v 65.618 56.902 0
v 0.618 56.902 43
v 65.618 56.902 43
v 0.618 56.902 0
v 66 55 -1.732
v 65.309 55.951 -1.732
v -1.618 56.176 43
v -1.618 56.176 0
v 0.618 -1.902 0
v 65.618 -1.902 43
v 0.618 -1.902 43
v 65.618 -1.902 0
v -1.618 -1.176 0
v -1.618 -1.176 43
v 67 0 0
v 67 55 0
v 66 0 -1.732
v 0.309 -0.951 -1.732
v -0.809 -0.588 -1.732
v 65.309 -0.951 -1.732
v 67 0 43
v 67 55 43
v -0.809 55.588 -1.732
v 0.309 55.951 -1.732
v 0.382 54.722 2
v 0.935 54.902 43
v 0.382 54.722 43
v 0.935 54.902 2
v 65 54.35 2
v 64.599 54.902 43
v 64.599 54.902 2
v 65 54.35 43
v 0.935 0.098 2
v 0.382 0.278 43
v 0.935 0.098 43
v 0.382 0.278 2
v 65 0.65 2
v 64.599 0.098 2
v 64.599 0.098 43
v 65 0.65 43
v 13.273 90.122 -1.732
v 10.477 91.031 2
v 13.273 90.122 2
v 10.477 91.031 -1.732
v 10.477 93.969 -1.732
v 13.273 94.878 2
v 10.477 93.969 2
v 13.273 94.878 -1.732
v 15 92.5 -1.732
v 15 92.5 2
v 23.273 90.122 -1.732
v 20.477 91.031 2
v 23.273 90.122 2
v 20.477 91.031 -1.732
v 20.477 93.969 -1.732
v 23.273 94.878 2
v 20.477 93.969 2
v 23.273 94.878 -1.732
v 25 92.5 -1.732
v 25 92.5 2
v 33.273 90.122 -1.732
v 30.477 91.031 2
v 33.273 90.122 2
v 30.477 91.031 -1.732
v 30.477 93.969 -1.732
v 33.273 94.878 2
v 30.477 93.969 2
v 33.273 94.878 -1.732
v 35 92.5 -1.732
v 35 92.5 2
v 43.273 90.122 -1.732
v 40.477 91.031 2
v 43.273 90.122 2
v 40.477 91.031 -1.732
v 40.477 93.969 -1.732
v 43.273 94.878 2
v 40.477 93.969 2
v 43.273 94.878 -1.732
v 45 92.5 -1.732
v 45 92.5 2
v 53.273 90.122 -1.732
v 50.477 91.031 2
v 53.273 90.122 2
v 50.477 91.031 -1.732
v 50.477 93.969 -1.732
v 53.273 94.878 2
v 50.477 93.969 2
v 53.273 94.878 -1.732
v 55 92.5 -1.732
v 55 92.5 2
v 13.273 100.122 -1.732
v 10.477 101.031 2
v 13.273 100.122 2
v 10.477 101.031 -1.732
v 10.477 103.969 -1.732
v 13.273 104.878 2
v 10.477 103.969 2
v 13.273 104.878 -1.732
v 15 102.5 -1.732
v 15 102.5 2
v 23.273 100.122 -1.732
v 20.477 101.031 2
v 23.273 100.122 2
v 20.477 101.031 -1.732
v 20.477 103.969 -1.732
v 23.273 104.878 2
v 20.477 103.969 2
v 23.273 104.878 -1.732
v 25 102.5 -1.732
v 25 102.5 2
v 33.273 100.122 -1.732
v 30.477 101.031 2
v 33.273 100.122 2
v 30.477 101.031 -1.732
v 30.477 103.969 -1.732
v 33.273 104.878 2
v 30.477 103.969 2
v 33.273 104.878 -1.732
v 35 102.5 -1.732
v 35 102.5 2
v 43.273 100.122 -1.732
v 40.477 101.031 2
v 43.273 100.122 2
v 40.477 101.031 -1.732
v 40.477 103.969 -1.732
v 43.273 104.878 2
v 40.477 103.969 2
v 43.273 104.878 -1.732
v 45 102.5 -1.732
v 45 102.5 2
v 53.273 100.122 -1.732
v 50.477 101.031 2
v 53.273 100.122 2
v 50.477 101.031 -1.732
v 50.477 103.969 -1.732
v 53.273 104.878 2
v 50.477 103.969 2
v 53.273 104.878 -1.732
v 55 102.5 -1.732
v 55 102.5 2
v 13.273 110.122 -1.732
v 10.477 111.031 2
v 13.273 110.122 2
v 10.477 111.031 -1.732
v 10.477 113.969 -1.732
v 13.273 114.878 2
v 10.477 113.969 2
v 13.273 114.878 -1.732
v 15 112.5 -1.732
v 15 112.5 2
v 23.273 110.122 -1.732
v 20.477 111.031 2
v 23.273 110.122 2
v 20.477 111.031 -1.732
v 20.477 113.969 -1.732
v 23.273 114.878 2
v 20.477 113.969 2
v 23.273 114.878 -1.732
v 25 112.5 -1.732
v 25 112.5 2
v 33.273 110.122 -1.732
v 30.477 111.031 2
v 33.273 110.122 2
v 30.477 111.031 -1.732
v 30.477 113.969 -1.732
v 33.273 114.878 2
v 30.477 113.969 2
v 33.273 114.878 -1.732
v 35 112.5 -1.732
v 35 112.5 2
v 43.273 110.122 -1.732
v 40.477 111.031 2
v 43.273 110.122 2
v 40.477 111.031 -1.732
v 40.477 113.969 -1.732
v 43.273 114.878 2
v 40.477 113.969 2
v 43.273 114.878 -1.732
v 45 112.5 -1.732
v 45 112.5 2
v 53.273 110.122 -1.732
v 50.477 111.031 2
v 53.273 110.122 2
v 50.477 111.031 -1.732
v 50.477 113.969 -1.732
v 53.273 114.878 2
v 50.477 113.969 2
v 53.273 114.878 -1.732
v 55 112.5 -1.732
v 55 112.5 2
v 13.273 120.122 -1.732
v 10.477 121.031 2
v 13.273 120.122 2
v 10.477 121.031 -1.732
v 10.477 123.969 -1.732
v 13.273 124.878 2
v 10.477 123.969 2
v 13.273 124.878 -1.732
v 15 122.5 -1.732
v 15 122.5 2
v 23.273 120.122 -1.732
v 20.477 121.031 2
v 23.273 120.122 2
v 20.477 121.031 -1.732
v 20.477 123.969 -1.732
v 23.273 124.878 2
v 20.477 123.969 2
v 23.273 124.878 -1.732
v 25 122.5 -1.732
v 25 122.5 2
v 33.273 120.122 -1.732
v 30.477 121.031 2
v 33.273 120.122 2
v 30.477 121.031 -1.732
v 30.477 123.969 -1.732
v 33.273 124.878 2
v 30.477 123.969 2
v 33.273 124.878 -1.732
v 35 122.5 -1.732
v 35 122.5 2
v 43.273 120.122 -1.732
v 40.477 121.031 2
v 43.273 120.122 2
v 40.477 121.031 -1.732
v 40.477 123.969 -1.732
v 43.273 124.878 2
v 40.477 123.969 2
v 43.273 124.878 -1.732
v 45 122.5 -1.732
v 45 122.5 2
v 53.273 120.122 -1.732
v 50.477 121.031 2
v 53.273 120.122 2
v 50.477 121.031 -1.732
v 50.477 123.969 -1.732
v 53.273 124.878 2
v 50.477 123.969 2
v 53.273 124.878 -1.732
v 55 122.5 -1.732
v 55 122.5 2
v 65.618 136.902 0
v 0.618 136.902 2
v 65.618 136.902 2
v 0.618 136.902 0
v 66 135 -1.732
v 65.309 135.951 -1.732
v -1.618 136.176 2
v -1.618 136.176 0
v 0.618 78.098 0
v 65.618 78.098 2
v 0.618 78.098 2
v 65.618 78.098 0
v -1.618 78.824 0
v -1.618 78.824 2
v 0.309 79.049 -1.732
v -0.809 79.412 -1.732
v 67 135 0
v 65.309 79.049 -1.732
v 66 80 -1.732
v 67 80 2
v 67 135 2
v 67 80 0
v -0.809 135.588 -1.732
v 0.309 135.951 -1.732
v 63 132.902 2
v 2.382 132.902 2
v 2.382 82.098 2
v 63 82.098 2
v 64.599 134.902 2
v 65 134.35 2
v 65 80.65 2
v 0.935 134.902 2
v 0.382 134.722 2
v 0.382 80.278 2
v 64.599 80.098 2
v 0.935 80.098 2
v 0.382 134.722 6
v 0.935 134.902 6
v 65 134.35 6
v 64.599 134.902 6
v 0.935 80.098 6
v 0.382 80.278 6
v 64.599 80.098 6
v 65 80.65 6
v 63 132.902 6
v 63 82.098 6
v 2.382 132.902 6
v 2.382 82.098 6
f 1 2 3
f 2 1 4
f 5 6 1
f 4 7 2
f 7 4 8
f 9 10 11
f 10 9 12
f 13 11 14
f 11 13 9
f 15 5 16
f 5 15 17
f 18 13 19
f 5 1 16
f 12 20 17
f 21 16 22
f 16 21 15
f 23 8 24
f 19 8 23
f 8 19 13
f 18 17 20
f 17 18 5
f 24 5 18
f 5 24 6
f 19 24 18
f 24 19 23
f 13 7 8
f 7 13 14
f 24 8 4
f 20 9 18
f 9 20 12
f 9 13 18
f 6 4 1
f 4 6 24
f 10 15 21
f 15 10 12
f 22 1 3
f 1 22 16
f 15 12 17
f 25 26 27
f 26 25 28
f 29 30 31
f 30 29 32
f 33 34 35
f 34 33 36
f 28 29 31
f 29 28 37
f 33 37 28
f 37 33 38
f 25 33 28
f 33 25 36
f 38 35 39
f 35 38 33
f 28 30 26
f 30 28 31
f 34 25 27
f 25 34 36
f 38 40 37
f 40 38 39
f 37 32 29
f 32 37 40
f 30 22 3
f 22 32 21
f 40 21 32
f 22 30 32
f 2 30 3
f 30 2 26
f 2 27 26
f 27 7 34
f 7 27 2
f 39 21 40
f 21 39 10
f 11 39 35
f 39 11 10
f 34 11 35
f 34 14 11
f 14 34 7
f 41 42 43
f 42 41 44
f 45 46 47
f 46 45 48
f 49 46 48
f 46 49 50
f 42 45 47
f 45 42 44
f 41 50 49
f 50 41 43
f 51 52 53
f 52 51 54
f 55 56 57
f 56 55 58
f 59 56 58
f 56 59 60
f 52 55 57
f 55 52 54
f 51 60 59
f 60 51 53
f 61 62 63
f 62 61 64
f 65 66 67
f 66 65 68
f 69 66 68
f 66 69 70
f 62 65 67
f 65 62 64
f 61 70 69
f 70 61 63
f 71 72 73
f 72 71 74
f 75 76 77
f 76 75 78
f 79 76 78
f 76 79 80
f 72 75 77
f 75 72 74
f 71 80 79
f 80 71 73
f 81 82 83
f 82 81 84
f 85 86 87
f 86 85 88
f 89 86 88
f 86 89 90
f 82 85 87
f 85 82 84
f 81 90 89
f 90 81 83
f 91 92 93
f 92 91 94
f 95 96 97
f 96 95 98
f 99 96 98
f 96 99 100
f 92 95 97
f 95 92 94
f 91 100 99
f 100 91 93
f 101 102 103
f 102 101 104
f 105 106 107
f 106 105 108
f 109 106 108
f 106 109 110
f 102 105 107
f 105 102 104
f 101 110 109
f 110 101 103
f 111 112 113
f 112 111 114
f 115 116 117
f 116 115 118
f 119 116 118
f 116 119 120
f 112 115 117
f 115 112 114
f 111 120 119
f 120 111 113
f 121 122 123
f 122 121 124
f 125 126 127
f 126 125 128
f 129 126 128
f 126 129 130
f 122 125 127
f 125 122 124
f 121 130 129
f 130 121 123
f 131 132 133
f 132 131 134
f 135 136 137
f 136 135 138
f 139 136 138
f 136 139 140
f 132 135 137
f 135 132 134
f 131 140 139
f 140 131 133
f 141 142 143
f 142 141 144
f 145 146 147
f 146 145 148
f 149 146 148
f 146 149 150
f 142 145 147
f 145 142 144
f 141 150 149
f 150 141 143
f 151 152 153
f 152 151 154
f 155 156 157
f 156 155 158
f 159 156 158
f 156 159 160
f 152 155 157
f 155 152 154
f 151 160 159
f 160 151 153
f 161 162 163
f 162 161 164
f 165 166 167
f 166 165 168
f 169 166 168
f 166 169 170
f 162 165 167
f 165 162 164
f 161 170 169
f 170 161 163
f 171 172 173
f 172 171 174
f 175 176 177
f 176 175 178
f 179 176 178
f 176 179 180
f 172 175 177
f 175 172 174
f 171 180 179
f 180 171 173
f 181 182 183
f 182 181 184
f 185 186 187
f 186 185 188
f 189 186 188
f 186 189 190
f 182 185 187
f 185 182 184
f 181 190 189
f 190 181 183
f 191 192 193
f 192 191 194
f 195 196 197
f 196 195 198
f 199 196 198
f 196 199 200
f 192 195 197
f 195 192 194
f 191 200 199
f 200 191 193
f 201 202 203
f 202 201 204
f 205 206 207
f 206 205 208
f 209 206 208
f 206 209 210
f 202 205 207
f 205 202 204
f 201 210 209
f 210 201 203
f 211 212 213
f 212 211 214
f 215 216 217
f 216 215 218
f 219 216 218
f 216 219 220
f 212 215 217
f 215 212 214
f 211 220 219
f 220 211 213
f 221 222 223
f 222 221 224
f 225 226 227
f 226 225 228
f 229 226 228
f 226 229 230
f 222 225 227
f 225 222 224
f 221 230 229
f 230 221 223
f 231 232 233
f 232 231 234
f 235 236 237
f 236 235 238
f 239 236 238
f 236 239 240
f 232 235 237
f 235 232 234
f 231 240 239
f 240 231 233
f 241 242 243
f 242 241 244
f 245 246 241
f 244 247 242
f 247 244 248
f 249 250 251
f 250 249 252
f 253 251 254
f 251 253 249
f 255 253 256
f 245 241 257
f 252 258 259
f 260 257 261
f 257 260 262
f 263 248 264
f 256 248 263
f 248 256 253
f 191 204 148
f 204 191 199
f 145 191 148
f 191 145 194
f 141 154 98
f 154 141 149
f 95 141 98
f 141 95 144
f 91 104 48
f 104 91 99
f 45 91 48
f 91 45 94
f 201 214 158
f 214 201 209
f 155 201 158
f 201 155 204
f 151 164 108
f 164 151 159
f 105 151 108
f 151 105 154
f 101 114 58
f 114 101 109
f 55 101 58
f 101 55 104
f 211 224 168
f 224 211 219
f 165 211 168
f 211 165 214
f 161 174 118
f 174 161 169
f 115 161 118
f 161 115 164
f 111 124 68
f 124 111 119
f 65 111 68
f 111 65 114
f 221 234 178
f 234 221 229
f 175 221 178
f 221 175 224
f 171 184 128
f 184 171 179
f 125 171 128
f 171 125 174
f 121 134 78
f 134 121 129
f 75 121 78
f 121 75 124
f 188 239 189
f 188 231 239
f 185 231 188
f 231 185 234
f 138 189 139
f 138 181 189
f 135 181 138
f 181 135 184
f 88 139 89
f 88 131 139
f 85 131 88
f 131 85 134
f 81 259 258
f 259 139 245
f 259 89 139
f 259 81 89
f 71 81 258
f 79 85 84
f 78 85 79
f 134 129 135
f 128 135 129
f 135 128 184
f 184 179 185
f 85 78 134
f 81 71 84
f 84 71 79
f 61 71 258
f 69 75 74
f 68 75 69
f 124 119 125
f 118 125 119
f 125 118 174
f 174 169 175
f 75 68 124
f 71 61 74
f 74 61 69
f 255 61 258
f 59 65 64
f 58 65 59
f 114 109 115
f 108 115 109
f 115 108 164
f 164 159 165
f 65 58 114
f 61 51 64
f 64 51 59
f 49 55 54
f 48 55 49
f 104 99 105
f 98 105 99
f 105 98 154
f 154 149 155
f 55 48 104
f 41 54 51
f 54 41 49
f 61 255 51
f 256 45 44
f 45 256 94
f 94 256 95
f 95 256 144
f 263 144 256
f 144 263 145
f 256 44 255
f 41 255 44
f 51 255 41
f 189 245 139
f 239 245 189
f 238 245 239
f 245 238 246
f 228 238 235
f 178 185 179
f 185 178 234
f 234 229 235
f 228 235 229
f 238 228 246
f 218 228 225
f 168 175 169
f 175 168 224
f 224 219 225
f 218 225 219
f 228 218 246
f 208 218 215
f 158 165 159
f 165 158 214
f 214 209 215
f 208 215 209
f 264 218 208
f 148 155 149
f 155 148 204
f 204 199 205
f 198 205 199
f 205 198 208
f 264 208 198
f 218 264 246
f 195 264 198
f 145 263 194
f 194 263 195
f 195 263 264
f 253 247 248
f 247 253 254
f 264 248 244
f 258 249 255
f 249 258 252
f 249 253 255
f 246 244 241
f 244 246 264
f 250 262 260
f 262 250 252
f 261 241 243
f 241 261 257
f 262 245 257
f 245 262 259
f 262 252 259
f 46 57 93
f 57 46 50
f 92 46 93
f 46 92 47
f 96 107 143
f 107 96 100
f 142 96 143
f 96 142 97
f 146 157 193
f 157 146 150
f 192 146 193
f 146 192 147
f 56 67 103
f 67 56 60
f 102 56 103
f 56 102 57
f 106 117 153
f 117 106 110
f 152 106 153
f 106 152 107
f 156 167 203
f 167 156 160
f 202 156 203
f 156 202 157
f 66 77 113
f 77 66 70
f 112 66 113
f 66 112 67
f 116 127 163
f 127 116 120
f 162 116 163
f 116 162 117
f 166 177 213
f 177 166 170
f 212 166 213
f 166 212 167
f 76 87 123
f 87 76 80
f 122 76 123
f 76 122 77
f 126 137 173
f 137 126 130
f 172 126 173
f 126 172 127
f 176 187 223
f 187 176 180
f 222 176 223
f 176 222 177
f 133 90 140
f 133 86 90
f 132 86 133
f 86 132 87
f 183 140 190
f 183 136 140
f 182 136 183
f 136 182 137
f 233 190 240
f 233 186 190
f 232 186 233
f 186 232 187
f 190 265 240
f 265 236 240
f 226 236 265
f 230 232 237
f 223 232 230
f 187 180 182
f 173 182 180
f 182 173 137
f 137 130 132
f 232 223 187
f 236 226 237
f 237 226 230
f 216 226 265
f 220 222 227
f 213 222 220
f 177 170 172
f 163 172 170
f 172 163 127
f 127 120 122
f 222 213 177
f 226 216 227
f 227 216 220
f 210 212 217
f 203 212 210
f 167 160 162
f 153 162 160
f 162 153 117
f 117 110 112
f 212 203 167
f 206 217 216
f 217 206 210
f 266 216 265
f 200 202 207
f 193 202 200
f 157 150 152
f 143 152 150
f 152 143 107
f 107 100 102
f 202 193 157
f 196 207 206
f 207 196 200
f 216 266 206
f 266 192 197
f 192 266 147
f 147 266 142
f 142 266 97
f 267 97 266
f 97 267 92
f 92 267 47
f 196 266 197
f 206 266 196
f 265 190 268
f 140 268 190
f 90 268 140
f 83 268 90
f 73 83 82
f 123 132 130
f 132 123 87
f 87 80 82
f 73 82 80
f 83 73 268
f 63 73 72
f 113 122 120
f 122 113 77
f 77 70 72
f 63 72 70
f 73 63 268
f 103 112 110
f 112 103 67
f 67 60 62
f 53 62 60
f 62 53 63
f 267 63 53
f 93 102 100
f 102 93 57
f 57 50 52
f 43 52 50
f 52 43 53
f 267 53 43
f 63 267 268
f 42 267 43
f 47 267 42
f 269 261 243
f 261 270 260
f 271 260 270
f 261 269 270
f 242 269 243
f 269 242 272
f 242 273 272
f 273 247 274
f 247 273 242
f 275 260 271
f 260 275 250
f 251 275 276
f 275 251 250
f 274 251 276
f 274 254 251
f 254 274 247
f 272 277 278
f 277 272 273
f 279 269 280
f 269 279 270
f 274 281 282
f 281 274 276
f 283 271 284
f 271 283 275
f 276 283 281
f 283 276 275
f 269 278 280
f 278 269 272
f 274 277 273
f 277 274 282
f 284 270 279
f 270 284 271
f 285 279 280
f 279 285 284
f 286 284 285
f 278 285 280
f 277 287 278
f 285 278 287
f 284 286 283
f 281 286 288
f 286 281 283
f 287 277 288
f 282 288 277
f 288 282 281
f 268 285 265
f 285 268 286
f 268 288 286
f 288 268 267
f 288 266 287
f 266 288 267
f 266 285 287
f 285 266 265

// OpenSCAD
length = 65;
width = 55;
height = 45;


wall = 2;		// thickness of box walls
cut = height-wall; // where to separate lid from box (where is seam)

lip = 3; // height of lip in units of wall

pin = 5.25; // diameter of pin (wire) to hold lid to box
np = 0; // number of pins per side

ep = 0.01; // fudge factor - if there is 'sprue, adjust
printspace = 25; // distance between lid and box

//led grid info

nx = 5; ny = 4;  // grid size
diam = 5; 		// led diameter
lt = [ 2.5*diam , 2.5*diam ,0];
echo("sides equals",nx*2*diam+diam, ny*2*diam+diam);

$fn = 5;

// make corners
points = [for (i=[0,1], j=[0:1],k=[0:1]) [length*i, width*j, height*k]];
	
module shell(w,p) { // make walls by making whole volume p=points, w=thickness
	hull(){
        for (q=p) { //outside wall
            translate(q) sphere(w);
        }
    }
}

module ext(h,w,t){ // remove volume that isnt walls h=height to extrude, w=thickness, t = wall-lip separation
	
		translate([0,0,t]) 
		linear_extrude(h) offset(r=-w) 
		projection() shell(wall,points);
}

module slice(w,c){ // w=wall (fudge factors), c = cut line
	translate([-w-1-ep,-w-1-ep,c]) cube([2*(length+ep),2*(width+ep),2*height]); } 
	
module pins(n,x,y,loc,dia,w) { //add locking pins; n = number, x = space to put in, loc = location (height of holes), dia = diameter of holes, w=wall thickness
	echo(n,x,y,loc,dia,w);
	if (n != 0) for (i = [1:n]){
		translate([i*x/n - x/(2*n),-w,loc]) 
			rotate([-90,0,0]) 
			cylinder(d=dia, h=3*w);	
		translate([i*x/n - x/(2*n),y-2*w,loc]) 
			rotate([-90,0,0]) 
			cylinder(d=dia, h=3*w);

	}
}	

module ledgrid(l,w,hgt,x,y,dia) {
	      
    for (i=[0:y-1], j=[0:x-1]) {
		translate([ j*2*dia , i*2*dia , -height/2])
		cylinder(h=hgt ,d=dia);
	}
}
	
difference(){ //box
   	shell(wall,points);
	ext(height,wall,wall);
	slice(wall,cut);
	
	pins(np,length,width,cut-wall,pin,wall);

}
translate([0,width + printspace,0])
{  //lid
	difference(){
    	shell(wall,points);
		ext(height,wall,wall);
		slice(wall,height-cut); 
		// make box, but only keep lid
		
		translate(lt) 
			ledgrid(length,width,height,nx,ny,diam);

}
	
	difference(){ 
	// make lip of box by making and removing smaller boxes
		ext(height,wall,wall);
		slice(2*wall,lip*(height-cut));
		ext(height,2*wall,wall);
		
		pins(np,length,width,height-(cut-wall),pin,wall);
		
	*	translate(lt) 
			ledgrid(length,width,height,nx,ny,diam);

	}
}
